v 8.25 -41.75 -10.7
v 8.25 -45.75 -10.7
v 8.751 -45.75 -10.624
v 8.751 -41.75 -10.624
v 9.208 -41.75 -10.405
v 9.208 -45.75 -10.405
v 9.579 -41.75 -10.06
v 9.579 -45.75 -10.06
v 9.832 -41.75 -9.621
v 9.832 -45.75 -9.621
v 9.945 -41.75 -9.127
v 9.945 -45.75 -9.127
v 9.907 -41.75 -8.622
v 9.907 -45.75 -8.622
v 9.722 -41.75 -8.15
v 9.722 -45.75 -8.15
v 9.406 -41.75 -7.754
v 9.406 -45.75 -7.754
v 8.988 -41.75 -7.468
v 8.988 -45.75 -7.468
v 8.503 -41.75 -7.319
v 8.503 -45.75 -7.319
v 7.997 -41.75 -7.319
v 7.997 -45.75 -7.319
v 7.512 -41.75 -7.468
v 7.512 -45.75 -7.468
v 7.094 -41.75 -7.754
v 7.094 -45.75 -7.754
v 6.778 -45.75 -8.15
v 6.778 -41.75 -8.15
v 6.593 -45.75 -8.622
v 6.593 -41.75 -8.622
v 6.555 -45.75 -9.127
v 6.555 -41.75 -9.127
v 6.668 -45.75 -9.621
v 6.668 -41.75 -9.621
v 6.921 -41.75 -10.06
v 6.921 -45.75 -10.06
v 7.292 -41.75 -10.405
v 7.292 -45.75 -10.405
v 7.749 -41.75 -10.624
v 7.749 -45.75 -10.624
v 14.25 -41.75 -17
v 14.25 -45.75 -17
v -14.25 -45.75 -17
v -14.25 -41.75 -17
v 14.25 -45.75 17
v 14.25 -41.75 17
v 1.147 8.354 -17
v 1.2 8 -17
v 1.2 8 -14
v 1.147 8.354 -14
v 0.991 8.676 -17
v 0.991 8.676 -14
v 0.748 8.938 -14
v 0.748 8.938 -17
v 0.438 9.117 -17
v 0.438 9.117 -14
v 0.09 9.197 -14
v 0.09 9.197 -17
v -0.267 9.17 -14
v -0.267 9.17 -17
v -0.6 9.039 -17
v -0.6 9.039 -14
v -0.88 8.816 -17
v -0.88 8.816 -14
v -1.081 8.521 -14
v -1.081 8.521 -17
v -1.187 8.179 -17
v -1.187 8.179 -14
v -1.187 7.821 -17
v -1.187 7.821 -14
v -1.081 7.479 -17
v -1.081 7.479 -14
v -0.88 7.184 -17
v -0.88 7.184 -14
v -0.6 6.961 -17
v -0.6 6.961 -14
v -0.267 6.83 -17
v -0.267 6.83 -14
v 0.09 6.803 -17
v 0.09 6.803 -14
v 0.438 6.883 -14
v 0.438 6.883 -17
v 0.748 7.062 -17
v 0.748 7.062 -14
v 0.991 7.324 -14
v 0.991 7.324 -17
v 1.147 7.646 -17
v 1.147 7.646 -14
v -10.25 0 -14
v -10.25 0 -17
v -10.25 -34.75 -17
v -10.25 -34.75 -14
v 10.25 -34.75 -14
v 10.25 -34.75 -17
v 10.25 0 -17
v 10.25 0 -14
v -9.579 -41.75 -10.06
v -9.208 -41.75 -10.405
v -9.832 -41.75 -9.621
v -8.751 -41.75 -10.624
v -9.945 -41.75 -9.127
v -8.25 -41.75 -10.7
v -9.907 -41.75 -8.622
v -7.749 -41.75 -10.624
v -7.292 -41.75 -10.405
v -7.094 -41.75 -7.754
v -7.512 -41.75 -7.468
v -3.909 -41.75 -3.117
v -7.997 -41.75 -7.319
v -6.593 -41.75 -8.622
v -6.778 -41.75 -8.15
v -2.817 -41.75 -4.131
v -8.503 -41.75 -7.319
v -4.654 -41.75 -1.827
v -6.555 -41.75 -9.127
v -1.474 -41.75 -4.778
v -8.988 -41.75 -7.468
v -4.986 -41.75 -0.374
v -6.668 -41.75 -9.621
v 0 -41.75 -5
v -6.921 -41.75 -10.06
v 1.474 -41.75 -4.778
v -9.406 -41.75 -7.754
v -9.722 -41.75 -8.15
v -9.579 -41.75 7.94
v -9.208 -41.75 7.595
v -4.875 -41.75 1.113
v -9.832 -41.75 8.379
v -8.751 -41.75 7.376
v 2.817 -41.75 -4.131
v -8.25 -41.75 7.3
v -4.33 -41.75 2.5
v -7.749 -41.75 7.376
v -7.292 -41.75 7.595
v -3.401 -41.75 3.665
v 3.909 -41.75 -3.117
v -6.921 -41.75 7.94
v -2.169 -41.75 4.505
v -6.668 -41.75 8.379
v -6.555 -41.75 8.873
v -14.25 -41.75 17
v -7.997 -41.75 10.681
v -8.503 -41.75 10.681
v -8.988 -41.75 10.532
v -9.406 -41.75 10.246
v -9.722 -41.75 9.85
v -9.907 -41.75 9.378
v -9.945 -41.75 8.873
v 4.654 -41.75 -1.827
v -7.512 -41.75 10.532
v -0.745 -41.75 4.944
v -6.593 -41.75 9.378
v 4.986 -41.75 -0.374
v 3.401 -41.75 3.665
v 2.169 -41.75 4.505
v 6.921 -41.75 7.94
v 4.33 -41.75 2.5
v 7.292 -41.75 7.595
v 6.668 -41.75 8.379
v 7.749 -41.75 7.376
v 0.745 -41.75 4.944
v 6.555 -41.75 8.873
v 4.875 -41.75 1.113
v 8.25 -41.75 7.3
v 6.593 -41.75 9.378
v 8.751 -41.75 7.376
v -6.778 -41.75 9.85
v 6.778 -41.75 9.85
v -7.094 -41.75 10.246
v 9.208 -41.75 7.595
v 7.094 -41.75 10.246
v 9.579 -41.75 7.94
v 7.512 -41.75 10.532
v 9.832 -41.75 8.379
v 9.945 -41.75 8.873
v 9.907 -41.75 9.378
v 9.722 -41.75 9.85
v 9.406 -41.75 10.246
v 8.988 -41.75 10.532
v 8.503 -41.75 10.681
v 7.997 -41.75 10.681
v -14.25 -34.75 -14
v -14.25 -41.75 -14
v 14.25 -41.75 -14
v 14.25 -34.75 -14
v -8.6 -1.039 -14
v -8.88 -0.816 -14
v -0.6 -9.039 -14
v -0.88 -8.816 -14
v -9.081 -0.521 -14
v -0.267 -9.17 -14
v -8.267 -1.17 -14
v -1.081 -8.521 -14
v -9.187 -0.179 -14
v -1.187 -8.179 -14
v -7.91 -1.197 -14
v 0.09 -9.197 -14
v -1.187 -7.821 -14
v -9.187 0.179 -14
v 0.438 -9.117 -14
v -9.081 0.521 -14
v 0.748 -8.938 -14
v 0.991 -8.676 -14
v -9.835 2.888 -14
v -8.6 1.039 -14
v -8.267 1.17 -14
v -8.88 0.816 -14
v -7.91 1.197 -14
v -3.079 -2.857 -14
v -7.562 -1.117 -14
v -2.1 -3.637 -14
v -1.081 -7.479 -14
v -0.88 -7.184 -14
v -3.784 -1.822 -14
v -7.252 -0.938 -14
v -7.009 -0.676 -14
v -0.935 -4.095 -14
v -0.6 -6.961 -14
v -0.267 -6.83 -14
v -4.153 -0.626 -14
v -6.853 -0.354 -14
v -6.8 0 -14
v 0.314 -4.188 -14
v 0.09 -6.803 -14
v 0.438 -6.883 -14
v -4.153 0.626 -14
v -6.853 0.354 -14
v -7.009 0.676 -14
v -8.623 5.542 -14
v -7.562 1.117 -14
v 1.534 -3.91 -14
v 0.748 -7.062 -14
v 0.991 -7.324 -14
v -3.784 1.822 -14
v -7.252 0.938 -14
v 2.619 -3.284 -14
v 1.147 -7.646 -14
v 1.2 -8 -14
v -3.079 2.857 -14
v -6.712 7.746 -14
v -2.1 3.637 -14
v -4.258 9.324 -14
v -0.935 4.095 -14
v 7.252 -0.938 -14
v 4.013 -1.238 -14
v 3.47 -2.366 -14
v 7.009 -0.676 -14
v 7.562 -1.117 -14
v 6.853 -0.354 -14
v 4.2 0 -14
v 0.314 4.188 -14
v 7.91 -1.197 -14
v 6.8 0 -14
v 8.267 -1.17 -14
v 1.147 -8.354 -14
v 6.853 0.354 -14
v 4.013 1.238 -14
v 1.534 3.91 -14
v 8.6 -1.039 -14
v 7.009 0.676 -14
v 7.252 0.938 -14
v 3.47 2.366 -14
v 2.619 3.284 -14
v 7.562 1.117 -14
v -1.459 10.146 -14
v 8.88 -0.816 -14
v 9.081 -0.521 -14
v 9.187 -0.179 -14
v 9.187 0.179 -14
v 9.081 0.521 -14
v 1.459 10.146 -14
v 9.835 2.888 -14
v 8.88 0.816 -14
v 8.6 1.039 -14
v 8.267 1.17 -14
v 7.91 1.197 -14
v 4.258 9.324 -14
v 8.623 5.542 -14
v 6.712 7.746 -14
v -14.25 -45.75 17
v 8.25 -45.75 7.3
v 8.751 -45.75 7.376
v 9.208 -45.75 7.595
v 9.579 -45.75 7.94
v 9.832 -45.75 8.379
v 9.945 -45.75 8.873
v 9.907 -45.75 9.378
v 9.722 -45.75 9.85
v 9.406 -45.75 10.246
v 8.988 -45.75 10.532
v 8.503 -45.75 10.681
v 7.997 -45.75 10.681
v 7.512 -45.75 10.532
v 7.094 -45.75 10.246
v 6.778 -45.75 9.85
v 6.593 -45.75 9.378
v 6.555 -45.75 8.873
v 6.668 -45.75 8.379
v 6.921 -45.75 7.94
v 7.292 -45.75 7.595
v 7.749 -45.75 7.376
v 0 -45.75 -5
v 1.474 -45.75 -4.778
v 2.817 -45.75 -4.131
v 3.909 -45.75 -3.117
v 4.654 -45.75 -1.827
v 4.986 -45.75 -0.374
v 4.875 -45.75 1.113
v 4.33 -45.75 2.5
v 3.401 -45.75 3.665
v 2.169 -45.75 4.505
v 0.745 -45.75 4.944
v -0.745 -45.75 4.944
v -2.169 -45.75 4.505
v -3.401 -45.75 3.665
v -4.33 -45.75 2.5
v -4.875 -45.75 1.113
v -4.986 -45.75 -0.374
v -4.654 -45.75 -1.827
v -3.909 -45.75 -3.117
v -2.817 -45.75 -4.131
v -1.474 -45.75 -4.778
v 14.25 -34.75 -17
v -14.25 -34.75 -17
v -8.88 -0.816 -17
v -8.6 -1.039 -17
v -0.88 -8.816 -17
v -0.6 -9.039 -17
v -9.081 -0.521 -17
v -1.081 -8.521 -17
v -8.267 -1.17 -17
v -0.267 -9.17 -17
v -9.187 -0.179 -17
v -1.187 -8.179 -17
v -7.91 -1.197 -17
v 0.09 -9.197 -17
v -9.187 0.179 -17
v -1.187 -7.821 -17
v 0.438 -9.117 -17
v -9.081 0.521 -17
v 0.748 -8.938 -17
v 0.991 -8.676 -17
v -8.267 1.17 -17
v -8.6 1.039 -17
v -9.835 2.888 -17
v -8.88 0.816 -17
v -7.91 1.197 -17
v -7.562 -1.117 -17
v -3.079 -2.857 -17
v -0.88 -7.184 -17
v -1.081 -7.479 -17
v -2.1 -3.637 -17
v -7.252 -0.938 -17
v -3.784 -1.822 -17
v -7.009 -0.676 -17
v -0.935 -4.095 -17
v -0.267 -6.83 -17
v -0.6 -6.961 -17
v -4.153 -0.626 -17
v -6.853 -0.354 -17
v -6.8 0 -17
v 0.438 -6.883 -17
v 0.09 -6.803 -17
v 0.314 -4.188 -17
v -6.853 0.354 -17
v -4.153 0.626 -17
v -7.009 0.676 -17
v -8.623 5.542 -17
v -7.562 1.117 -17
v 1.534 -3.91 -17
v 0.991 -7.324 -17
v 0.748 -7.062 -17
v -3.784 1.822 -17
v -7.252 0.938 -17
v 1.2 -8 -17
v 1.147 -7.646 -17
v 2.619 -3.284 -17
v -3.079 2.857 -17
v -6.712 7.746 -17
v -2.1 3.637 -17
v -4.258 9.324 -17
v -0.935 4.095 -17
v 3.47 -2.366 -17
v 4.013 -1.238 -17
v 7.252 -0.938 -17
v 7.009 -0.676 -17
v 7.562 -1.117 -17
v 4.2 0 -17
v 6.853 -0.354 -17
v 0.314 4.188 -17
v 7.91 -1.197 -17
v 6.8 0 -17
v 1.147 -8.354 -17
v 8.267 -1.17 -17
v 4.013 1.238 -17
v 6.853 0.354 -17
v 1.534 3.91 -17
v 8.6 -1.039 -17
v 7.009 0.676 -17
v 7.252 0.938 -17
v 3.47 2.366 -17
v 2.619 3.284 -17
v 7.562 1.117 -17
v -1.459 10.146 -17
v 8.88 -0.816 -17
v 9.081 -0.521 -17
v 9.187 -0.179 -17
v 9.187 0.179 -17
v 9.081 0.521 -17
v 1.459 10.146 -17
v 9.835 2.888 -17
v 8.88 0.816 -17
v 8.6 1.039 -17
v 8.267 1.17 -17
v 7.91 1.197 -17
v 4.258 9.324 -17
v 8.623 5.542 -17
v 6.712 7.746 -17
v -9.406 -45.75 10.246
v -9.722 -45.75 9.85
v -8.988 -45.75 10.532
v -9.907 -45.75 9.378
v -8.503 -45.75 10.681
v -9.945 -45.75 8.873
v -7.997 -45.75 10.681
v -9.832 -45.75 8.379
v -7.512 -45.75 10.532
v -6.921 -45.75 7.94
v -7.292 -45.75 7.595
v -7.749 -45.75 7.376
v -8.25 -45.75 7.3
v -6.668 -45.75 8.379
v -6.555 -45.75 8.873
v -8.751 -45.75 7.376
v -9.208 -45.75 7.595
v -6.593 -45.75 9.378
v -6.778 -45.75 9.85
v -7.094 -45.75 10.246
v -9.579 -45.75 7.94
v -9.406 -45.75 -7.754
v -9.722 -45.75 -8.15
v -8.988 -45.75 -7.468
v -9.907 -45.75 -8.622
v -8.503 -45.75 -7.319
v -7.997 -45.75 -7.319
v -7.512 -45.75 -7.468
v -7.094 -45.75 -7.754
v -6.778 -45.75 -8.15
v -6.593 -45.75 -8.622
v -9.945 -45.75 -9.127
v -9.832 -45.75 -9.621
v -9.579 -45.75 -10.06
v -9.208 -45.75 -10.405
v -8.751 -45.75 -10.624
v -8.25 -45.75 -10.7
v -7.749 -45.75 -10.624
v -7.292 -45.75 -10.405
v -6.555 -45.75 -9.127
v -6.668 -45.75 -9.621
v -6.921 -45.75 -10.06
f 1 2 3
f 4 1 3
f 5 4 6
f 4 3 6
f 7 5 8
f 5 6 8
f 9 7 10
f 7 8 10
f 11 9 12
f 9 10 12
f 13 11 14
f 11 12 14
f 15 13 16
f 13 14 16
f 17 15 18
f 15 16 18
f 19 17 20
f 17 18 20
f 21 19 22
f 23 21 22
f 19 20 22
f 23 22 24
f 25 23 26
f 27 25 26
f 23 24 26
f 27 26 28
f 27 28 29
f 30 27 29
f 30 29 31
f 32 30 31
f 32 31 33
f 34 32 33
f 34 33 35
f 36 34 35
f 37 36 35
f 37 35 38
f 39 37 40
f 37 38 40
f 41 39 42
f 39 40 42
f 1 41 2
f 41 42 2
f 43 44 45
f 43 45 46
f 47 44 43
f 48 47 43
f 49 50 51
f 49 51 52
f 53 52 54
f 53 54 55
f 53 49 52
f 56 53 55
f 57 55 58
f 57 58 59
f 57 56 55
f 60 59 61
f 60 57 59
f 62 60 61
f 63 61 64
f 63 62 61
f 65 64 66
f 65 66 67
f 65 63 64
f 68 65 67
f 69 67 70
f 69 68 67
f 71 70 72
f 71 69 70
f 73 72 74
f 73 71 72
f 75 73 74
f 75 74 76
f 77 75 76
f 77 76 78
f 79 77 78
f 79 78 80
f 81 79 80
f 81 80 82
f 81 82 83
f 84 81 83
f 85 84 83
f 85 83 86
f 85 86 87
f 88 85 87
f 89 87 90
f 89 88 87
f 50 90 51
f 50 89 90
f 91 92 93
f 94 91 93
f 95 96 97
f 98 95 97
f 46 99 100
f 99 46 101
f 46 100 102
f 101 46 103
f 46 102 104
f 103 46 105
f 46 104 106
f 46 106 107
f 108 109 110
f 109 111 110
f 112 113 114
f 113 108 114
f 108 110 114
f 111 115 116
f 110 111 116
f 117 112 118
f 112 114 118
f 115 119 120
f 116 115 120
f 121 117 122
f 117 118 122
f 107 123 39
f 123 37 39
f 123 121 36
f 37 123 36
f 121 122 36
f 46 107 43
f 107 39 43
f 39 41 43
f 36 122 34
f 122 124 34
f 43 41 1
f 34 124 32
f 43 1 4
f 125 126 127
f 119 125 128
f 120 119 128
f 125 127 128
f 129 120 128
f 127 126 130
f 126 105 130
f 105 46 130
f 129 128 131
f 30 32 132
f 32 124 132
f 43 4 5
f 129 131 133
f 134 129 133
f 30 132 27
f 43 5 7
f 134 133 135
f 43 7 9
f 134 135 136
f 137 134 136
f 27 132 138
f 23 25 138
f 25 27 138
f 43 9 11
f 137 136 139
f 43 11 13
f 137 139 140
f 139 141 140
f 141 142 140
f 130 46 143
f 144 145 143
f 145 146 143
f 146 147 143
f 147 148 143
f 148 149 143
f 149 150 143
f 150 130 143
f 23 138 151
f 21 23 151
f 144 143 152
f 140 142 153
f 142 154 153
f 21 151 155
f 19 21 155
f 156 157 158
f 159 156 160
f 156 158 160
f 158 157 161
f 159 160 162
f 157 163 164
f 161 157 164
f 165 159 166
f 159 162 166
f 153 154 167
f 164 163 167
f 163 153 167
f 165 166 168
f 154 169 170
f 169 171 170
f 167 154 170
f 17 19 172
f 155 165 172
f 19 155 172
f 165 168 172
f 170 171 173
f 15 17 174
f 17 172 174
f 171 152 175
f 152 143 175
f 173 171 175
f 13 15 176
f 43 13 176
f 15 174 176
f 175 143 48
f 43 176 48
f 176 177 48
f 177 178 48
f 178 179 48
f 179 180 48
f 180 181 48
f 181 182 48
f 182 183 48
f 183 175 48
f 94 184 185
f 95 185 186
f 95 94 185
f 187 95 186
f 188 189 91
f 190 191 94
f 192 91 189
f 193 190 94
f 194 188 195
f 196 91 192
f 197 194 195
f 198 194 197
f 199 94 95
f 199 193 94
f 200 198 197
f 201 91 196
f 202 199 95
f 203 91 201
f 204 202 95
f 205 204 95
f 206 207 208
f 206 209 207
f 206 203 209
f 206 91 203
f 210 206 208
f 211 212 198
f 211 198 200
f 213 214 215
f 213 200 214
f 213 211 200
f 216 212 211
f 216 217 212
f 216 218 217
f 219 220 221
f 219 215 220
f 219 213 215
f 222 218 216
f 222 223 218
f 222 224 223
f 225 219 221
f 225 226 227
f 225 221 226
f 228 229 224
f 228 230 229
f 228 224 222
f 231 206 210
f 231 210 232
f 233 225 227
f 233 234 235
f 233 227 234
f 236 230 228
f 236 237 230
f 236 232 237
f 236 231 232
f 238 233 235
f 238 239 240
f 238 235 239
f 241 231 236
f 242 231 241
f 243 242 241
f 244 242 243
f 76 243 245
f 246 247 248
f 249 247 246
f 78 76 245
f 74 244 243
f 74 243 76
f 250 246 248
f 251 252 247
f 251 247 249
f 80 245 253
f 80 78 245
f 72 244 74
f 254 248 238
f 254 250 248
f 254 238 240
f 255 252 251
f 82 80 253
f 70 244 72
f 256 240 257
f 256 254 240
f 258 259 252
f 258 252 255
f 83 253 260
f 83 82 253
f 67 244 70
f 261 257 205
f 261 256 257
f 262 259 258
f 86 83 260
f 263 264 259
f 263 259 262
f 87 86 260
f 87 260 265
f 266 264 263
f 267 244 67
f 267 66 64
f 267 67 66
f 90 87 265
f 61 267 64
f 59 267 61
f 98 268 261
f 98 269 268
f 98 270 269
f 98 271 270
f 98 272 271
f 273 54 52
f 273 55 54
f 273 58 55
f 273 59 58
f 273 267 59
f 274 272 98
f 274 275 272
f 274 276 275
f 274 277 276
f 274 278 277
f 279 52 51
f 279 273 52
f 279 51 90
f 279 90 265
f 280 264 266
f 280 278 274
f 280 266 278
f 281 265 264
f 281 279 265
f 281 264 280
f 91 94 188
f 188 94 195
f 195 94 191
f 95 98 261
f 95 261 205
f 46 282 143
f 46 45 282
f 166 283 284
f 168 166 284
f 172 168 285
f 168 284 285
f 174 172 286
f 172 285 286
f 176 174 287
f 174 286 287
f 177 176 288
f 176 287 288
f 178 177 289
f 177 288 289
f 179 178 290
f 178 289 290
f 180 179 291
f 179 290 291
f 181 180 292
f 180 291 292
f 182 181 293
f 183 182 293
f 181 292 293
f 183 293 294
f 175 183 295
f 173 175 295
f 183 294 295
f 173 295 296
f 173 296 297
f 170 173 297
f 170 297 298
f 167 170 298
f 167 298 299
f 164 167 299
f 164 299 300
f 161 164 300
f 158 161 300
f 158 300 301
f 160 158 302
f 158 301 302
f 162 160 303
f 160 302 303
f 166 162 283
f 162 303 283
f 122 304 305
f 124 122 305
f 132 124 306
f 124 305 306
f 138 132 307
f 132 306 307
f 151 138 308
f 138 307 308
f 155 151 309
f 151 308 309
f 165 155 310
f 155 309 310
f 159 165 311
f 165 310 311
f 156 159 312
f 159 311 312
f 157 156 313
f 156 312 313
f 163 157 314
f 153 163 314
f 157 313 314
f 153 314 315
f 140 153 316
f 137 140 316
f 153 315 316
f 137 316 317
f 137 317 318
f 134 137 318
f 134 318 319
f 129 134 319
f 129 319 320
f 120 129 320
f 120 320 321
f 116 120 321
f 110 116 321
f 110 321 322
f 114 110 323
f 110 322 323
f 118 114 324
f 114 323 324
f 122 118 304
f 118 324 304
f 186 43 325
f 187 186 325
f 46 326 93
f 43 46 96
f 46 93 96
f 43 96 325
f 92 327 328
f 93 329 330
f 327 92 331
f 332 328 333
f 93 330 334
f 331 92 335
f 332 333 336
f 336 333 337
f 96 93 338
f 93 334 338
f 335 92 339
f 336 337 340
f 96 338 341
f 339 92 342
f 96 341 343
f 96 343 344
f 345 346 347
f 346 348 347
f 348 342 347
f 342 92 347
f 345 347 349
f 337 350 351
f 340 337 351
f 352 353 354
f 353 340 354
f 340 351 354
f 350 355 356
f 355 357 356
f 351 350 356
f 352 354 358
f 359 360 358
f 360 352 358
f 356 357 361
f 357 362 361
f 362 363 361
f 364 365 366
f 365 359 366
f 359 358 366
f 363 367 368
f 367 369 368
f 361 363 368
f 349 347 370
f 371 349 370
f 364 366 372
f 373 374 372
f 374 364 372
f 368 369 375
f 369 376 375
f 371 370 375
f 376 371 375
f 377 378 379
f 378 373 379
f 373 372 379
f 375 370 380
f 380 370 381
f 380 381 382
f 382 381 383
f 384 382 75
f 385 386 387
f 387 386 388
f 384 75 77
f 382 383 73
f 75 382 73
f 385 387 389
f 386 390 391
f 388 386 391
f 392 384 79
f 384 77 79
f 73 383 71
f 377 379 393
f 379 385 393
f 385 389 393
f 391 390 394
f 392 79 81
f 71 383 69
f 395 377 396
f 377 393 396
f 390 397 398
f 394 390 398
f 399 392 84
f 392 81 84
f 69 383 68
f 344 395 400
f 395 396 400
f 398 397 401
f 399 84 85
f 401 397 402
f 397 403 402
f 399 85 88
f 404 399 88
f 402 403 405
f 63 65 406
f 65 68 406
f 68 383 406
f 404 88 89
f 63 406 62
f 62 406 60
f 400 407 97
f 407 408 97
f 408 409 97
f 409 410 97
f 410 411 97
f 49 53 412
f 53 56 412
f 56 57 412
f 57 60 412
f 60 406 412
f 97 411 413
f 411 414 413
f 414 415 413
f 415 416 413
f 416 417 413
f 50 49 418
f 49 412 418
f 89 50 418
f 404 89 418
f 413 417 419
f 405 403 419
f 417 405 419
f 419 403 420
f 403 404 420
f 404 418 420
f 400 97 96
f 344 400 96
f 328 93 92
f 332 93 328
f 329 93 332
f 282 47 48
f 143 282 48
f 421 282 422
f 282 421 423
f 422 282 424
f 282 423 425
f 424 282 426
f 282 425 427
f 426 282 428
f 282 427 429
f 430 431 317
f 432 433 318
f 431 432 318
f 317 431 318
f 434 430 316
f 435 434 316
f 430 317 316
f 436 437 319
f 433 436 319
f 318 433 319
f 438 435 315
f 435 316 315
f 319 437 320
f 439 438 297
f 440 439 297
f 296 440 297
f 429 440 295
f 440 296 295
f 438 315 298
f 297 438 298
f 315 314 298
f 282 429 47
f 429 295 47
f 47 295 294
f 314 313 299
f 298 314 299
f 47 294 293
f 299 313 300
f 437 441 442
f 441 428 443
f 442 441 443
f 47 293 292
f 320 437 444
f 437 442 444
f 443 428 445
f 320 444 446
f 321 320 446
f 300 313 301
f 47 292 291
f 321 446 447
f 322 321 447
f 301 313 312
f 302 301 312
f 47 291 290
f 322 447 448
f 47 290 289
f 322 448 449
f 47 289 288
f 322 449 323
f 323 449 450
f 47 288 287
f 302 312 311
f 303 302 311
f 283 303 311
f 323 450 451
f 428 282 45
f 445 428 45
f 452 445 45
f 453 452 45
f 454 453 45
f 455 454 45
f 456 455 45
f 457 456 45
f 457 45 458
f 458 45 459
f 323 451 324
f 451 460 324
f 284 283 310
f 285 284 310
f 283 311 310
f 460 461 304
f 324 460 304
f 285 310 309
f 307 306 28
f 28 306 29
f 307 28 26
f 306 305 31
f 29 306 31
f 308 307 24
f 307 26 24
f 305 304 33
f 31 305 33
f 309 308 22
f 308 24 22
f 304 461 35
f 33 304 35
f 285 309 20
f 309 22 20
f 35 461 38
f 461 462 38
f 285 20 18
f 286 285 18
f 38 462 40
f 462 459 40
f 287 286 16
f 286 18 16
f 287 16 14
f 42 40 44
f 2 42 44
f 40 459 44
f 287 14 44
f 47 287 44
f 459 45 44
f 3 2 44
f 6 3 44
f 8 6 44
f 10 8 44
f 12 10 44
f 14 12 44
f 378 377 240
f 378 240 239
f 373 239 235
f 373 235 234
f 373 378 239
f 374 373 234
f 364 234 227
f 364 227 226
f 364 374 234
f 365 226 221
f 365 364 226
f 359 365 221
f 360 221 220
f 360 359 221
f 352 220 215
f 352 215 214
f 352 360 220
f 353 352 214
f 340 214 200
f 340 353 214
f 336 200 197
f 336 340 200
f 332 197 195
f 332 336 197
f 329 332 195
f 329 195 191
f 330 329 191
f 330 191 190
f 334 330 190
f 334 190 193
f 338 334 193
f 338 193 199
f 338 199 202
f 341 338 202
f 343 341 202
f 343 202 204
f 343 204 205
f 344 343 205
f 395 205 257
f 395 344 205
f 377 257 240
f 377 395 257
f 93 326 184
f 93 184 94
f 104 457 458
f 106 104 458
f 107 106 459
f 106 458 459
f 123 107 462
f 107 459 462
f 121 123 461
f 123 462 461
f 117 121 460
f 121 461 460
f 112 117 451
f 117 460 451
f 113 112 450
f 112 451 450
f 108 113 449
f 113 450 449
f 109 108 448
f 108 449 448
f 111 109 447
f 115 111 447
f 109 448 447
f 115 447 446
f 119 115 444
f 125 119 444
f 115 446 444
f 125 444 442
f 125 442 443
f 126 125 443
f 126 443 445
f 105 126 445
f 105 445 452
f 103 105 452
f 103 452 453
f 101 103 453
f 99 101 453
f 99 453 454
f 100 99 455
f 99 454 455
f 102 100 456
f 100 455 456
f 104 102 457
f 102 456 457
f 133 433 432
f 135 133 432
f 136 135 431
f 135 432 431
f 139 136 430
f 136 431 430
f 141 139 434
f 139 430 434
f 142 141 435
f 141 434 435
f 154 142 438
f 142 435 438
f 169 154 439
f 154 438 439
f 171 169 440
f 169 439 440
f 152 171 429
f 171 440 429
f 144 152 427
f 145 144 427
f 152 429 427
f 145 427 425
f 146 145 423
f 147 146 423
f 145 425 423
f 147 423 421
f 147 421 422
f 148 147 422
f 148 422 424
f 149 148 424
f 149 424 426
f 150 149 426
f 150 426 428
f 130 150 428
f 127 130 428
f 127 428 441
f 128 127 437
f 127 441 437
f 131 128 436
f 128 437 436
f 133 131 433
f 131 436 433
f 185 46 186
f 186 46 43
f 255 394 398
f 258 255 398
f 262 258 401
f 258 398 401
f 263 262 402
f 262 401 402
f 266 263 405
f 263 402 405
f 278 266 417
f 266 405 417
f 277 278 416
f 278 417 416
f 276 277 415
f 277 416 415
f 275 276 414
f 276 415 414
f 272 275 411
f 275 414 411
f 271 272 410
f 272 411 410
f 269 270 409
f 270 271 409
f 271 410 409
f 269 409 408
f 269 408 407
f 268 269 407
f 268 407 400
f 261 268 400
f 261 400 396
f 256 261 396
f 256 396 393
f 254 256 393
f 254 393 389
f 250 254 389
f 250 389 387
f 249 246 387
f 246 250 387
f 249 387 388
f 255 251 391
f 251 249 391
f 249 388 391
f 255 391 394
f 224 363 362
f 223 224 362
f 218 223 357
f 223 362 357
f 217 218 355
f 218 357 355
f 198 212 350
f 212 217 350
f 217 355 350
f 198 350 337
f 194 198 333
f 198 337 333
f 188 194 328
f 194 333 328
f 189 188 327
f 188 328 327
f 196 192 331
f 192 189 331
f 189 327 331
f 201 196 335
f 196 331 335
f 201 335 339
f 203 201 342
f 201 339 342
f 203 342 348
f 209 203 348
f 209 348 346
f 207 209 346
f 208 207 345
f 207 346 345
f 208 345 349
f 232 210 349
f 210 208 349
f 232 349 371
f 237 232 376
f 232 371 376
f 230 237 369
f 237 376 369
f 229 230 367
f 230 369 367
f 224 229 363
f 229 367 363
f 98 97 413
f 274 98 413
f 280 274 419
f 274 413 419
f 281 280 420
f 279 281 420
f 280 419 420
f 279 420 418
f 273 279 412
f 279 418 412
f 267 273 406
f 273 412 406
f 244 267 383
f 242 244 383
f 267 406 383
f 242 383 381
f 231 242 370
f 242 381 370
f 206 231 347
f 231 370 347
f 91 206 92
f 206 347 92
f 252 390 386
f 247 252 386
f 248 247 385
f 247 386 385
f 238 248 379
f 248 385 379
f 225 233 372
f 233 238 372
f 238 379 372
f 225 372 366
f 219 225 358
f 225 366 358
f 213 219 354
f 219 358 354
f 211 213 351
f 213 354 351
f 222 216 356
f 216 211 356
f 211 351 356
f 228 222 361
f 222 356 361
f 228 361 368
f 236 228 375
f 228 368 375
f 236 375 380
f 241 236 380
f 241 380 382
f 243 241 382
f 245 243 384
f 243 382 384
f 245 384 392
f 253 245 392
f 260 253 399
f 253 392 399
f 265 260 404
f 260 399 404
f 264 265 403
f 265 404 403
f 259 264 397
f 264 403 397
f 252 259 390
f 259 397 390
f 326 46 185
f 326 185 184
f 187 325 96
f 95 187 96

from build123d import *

# Parameters (mm, degrees)
BOSS_EXTRUDE1_DEPTH      = 22
BOSS_EXTRUDE1_DEPTH_BACK = 22
SKETCH1_R                = 1.2
SKETCH1_R_2              = 4.2
SKETCH2_W                = 38
SKETCH2_H                = 20
CUT_EXTRUDE1_DEPTH       = 105.423416914
SKETCH3_W                = 7
SKETCH3_H                = 44
BOSS_EXTRUDE2_DEPTH      = 36
SKETCH5_W                = 34
SKETCH5_H                = 50
CUT_EXTRUDE3_DEPTH       = 109.047443283
SKETCH6_W                = 20.5
SKETCH6_H                = 54.25
CUT_EXTRUDE4_DEPTH       = 111.605436123
SKETCH20_W               = 28.5
SKETCH20_H               = 34
SKETCH20_R               = 1.7
SKETCH20_R_2             = 5
BOSS_EXTRUDE5_DEPTH      = 4
SKETCH21_W               = 3
SKETCH21_H               = 36
CUT_EXTRUDE12_DEPTH      = 66.777085676
SKETCH22_W               = 4
SKETCH22_H               = 25
CUT_EXTRUDE14_DEPTH      = 66.054784605
SKETCH23_W               = 5
SKETCH23_H               = 56
CUT_EXTRUDE15_DEPTH      = 59.21780226
SKETCH24_R               = 1.2
SKETCH24_R_2             = 4.2
BOSS_EXTRUDE8_DEPTH      = 3
CUT_EXTRUDE16_DEPTH      = 57.367654732
CUT_EXTRUDE16_DEPTH_BACK = 57.367654732
SKETCH25_W               = 5
SKETCH25_H               = 56


with BuildPart() as part:
    # Sketch1 → Boss-Extrude1 (new, two sides: drawn at the far end of the back side and taken through both)
    with BuildSketch(Plane.XY.offset(-BOSS_EXTRUDE1_DEPTH_BACK)):
        with BuildLine():
            ThreePointArc((10.25, 0), (0, 10.25), (-10.25, 0))
            Line((-10.25, 0), (-10.25, -100))
            Line((-10.25, -100), (10.25, -100))
            Line((10.25, -100), (10.25, 0))
        make_face()
        with Locations((8, 0)):
            Circle(SKETCH1_R, mode=Mode.SUBTRACT)
        with Locations((0, 8)):
            Circle(SKETCH1_R, mode=Mode.SUBTRACT)
        with Locations((-8, 0)):
            Circle(SKETCH1_R, mode=Mode.SUBTRACT)
        Circle(SKETCH1_R_2, mode=Mode.SUBTRACT)
        with Locations((0, -8)):
            Circle(SKETCH1_R, mode=Mode.SUBTRACT)
    extrude(amount=BOSS_EXTRUDE1_DEPTH + BOSS_EXTRUDE1_DEPTH_BACK)

    # Sketch2 → Cut-Extrude1 (cut, through all)
    with BuildSketch(Plane.ZY.offset(10.25)):
        with Locations((0, 0.25)):
            Rectangle(SKETCH2_W, SKETCH2_H)
    extrude(amount=-CUT_EXTRUDE1_DEPTH, mode=Mode.SUBTRACT)

    # Sketch3 → Boss-Extrude2 (add)
    with BuildSketch(Plane(origin=(0, -9.75, 0), x_dir=(1, 0, 0), z_dir=(0, 1, 0))):
        with Locations((-13.75, 0)):
            Rectangle(SKETCH3_W, SKETCH3_H)
        with Locations((13.75, 0)):
            Rectangle(SKETCH3_W, SKETCH3_H)
    extrude(amount=-BOSS_EXTRUDE2_DEPTH)

    # Sketch5 → Cut-Extrude3 (cut, through all)
    with BuildSketch(Plane.ZY.offset(17.25)):
        with Locations((0, -34.75)):
            Rectangle(SKETCH5_W, SKETCH5_H)
    extrude(amount=-CUT_EXTRUDE3_DEPTH, mode=Mode.SUBTRACT)

    # Sketch6 → Cut-Extrude4 (cut, through all)
    with BuildSketch(Plane.XY.offset(22)):
        with Locations((0, -72.875)):
            Rectangle(SKETCH6_W, SKETCH6_H)
    extrude(amount=-CUT_EXTRUDE4_DEPTH, mode=Mode.SUBTRACT)


with BuildPart() as cut_extrude4_piece_1:
    # of the separate pieces the step leaves, piece 1, a body of its own (cut_extrude4_pieces)
    add(part.part.solids().sort_by_distance((17.25, -45.75, -17))[0])



with BuildPart() as cut_extrude4_piece_2:
    # of the separate pieces the step leaves, piece 2, a body of its own (cut_extrude4_pieces)
    add(part.part.solids().sort_by_distance((-10.25, 0, 22))[0])


with BuildPart() as cut_extrude4_piece_1_1:
    add(cut_extrude4_piece_1.part)

    add(cut_extrude4_piece_2.part)  # Boss-Extrude5 merges Cut-Extrude4 piece 2
    # Sketch20 → Boss-Extrude5 (add)
    with BuildSketch(Plane.XZ.offset(45.75)):
        Rectangle(SKETCH20_W, SKETCH20_H)
        with Locations((-8.25, -9)):
            Circle(SKETCH20_R, mode=Mode.SUBTRACT)
        with Locations((8.25, -9)):
            Circle(SKETCH20_R, mode=Mode.SUBTRACT)
        with Locations((-8.25, 9)):
            Circle(SKETCH20_R, mode=Mode.SUBTRACT)
        Circle(SKETCH20_R_2, mode=Mode.SUBTRACT)
        with Locations((8.25, 9)):
            Circle(SKETCH20_R, mode=Mode.SUBTRACT)
    extrude(amount=-BOSS_EXTRUDE5_DEPTH)

    # Sketch21 → Cut-Extrude12 (cut, through all)
    with BuildSketch(Plane(origin=(0, 0, -22), x_dir=(-1, 0, 0), z_dir=(0, 0, -1))):
        with Locations((-15.75, -27.75)):
            Rectangle(SKETCH21_W, SKETCH21_H)
        with Locations((15.75, -27.75)):
            Rectangle(SKETCH21_W, SKETCH21_H)
    extrude(amount=-CUT_EXTRUDE12_DEPTH, mode=Mode.SUBTRACT)

    # Sketch22 → Cut-Extrude14 (cut, through all)
    with BuildSketch(Plane(origin=(0, 0, -22), x_dir=(-1, 0, 0), z_dir=(0, 0, -1))):
        with Locations((12.25, -22.25)):
            Rectangle(SKETCH22_W, SKETCH22_H)
    extrude(amount=-CUT_EXTRUDE14_DEPTH, mode=Mode.SUBTRACT)

    # Sketch23 → Cut-Extrude15 (cut, through all)
    with BuildSketch(Plane(origin=(14.25, 0, 0), x_dir=(0, 0, -1), z_dir=(1, 0, 0))):
        with Locations((-19.5, -17.75)):
            Rectangle(SKETCH23_W, SKETCH23_H)
    extrude(amount=-CUT_EXTRUDE15_DEPTH, mode=Mode.SUBTRACT)

    # Sketch25 → Cut-Extrude16 (cut, two sides: drawn at the far end of the back side and taken through both)
    with BuildSketch(Plane.ZY.offset(10.25).offset(-CUT_EXTRUDE16_DEPTH_BACK)):
        with Locations((-19.5, -17.75)):
            Rectangle(SKETCH25_W, SKETCH25_H)
    extrude(amount=CUT_EXTRUDE16_DEPTH + CUT_EXTRUDE16_DEPTH_BACK, mode=Mode.SUBTRACT)


with BuildPart() as body_2:
    # Sketch24 → Boss-Extrude8 (new body)
    with BuildSketch(Plane.XY.offset(-17)):
        with BuildLine():
            Line((14.25, -41.75), (14.25, -34.75))
            Line((14.25, -34.75), (10.25, -34.75))
            Line((10.25, -34.75), (10.25, 0))
            ThreePointArc((10.25, 0), (0, 10.25), (-10.25, 0))
            Line((-10.25, 0), (-10.25, -34.75))
            Line((-10.25, -34.75), (-14.25, -34.75))
            Line((-14.25, -34.75), (-14.25, -41.75))
            Line((-14.25, -41.75), (14.25, -41.75))
        make_face()
        with Locations((0, -8)):
            Circle(SKETCH24_R, mode=Mode.SUBTRACT)
        with Locations((-8, 0)):
            Circle(SKETCH24_R, mode=Mode.SUBTRACT)
        Circle(SKETCH24_R_2, mode=Mode.SUBTRACT)
        with Locations((8, 0)):
            Circle(SKETCH24_R, mode=Mode.SUBTRACT)
        with Locations((0, 8)):
            Circle(SKETCH24_R, mode=Mode.SUBTRACT)
    extrude(amount=BOSS_EXTRUDE8_DEPTH)


solid = Compound([cut_extrude4_piece_1_1.part, body_2.part])
